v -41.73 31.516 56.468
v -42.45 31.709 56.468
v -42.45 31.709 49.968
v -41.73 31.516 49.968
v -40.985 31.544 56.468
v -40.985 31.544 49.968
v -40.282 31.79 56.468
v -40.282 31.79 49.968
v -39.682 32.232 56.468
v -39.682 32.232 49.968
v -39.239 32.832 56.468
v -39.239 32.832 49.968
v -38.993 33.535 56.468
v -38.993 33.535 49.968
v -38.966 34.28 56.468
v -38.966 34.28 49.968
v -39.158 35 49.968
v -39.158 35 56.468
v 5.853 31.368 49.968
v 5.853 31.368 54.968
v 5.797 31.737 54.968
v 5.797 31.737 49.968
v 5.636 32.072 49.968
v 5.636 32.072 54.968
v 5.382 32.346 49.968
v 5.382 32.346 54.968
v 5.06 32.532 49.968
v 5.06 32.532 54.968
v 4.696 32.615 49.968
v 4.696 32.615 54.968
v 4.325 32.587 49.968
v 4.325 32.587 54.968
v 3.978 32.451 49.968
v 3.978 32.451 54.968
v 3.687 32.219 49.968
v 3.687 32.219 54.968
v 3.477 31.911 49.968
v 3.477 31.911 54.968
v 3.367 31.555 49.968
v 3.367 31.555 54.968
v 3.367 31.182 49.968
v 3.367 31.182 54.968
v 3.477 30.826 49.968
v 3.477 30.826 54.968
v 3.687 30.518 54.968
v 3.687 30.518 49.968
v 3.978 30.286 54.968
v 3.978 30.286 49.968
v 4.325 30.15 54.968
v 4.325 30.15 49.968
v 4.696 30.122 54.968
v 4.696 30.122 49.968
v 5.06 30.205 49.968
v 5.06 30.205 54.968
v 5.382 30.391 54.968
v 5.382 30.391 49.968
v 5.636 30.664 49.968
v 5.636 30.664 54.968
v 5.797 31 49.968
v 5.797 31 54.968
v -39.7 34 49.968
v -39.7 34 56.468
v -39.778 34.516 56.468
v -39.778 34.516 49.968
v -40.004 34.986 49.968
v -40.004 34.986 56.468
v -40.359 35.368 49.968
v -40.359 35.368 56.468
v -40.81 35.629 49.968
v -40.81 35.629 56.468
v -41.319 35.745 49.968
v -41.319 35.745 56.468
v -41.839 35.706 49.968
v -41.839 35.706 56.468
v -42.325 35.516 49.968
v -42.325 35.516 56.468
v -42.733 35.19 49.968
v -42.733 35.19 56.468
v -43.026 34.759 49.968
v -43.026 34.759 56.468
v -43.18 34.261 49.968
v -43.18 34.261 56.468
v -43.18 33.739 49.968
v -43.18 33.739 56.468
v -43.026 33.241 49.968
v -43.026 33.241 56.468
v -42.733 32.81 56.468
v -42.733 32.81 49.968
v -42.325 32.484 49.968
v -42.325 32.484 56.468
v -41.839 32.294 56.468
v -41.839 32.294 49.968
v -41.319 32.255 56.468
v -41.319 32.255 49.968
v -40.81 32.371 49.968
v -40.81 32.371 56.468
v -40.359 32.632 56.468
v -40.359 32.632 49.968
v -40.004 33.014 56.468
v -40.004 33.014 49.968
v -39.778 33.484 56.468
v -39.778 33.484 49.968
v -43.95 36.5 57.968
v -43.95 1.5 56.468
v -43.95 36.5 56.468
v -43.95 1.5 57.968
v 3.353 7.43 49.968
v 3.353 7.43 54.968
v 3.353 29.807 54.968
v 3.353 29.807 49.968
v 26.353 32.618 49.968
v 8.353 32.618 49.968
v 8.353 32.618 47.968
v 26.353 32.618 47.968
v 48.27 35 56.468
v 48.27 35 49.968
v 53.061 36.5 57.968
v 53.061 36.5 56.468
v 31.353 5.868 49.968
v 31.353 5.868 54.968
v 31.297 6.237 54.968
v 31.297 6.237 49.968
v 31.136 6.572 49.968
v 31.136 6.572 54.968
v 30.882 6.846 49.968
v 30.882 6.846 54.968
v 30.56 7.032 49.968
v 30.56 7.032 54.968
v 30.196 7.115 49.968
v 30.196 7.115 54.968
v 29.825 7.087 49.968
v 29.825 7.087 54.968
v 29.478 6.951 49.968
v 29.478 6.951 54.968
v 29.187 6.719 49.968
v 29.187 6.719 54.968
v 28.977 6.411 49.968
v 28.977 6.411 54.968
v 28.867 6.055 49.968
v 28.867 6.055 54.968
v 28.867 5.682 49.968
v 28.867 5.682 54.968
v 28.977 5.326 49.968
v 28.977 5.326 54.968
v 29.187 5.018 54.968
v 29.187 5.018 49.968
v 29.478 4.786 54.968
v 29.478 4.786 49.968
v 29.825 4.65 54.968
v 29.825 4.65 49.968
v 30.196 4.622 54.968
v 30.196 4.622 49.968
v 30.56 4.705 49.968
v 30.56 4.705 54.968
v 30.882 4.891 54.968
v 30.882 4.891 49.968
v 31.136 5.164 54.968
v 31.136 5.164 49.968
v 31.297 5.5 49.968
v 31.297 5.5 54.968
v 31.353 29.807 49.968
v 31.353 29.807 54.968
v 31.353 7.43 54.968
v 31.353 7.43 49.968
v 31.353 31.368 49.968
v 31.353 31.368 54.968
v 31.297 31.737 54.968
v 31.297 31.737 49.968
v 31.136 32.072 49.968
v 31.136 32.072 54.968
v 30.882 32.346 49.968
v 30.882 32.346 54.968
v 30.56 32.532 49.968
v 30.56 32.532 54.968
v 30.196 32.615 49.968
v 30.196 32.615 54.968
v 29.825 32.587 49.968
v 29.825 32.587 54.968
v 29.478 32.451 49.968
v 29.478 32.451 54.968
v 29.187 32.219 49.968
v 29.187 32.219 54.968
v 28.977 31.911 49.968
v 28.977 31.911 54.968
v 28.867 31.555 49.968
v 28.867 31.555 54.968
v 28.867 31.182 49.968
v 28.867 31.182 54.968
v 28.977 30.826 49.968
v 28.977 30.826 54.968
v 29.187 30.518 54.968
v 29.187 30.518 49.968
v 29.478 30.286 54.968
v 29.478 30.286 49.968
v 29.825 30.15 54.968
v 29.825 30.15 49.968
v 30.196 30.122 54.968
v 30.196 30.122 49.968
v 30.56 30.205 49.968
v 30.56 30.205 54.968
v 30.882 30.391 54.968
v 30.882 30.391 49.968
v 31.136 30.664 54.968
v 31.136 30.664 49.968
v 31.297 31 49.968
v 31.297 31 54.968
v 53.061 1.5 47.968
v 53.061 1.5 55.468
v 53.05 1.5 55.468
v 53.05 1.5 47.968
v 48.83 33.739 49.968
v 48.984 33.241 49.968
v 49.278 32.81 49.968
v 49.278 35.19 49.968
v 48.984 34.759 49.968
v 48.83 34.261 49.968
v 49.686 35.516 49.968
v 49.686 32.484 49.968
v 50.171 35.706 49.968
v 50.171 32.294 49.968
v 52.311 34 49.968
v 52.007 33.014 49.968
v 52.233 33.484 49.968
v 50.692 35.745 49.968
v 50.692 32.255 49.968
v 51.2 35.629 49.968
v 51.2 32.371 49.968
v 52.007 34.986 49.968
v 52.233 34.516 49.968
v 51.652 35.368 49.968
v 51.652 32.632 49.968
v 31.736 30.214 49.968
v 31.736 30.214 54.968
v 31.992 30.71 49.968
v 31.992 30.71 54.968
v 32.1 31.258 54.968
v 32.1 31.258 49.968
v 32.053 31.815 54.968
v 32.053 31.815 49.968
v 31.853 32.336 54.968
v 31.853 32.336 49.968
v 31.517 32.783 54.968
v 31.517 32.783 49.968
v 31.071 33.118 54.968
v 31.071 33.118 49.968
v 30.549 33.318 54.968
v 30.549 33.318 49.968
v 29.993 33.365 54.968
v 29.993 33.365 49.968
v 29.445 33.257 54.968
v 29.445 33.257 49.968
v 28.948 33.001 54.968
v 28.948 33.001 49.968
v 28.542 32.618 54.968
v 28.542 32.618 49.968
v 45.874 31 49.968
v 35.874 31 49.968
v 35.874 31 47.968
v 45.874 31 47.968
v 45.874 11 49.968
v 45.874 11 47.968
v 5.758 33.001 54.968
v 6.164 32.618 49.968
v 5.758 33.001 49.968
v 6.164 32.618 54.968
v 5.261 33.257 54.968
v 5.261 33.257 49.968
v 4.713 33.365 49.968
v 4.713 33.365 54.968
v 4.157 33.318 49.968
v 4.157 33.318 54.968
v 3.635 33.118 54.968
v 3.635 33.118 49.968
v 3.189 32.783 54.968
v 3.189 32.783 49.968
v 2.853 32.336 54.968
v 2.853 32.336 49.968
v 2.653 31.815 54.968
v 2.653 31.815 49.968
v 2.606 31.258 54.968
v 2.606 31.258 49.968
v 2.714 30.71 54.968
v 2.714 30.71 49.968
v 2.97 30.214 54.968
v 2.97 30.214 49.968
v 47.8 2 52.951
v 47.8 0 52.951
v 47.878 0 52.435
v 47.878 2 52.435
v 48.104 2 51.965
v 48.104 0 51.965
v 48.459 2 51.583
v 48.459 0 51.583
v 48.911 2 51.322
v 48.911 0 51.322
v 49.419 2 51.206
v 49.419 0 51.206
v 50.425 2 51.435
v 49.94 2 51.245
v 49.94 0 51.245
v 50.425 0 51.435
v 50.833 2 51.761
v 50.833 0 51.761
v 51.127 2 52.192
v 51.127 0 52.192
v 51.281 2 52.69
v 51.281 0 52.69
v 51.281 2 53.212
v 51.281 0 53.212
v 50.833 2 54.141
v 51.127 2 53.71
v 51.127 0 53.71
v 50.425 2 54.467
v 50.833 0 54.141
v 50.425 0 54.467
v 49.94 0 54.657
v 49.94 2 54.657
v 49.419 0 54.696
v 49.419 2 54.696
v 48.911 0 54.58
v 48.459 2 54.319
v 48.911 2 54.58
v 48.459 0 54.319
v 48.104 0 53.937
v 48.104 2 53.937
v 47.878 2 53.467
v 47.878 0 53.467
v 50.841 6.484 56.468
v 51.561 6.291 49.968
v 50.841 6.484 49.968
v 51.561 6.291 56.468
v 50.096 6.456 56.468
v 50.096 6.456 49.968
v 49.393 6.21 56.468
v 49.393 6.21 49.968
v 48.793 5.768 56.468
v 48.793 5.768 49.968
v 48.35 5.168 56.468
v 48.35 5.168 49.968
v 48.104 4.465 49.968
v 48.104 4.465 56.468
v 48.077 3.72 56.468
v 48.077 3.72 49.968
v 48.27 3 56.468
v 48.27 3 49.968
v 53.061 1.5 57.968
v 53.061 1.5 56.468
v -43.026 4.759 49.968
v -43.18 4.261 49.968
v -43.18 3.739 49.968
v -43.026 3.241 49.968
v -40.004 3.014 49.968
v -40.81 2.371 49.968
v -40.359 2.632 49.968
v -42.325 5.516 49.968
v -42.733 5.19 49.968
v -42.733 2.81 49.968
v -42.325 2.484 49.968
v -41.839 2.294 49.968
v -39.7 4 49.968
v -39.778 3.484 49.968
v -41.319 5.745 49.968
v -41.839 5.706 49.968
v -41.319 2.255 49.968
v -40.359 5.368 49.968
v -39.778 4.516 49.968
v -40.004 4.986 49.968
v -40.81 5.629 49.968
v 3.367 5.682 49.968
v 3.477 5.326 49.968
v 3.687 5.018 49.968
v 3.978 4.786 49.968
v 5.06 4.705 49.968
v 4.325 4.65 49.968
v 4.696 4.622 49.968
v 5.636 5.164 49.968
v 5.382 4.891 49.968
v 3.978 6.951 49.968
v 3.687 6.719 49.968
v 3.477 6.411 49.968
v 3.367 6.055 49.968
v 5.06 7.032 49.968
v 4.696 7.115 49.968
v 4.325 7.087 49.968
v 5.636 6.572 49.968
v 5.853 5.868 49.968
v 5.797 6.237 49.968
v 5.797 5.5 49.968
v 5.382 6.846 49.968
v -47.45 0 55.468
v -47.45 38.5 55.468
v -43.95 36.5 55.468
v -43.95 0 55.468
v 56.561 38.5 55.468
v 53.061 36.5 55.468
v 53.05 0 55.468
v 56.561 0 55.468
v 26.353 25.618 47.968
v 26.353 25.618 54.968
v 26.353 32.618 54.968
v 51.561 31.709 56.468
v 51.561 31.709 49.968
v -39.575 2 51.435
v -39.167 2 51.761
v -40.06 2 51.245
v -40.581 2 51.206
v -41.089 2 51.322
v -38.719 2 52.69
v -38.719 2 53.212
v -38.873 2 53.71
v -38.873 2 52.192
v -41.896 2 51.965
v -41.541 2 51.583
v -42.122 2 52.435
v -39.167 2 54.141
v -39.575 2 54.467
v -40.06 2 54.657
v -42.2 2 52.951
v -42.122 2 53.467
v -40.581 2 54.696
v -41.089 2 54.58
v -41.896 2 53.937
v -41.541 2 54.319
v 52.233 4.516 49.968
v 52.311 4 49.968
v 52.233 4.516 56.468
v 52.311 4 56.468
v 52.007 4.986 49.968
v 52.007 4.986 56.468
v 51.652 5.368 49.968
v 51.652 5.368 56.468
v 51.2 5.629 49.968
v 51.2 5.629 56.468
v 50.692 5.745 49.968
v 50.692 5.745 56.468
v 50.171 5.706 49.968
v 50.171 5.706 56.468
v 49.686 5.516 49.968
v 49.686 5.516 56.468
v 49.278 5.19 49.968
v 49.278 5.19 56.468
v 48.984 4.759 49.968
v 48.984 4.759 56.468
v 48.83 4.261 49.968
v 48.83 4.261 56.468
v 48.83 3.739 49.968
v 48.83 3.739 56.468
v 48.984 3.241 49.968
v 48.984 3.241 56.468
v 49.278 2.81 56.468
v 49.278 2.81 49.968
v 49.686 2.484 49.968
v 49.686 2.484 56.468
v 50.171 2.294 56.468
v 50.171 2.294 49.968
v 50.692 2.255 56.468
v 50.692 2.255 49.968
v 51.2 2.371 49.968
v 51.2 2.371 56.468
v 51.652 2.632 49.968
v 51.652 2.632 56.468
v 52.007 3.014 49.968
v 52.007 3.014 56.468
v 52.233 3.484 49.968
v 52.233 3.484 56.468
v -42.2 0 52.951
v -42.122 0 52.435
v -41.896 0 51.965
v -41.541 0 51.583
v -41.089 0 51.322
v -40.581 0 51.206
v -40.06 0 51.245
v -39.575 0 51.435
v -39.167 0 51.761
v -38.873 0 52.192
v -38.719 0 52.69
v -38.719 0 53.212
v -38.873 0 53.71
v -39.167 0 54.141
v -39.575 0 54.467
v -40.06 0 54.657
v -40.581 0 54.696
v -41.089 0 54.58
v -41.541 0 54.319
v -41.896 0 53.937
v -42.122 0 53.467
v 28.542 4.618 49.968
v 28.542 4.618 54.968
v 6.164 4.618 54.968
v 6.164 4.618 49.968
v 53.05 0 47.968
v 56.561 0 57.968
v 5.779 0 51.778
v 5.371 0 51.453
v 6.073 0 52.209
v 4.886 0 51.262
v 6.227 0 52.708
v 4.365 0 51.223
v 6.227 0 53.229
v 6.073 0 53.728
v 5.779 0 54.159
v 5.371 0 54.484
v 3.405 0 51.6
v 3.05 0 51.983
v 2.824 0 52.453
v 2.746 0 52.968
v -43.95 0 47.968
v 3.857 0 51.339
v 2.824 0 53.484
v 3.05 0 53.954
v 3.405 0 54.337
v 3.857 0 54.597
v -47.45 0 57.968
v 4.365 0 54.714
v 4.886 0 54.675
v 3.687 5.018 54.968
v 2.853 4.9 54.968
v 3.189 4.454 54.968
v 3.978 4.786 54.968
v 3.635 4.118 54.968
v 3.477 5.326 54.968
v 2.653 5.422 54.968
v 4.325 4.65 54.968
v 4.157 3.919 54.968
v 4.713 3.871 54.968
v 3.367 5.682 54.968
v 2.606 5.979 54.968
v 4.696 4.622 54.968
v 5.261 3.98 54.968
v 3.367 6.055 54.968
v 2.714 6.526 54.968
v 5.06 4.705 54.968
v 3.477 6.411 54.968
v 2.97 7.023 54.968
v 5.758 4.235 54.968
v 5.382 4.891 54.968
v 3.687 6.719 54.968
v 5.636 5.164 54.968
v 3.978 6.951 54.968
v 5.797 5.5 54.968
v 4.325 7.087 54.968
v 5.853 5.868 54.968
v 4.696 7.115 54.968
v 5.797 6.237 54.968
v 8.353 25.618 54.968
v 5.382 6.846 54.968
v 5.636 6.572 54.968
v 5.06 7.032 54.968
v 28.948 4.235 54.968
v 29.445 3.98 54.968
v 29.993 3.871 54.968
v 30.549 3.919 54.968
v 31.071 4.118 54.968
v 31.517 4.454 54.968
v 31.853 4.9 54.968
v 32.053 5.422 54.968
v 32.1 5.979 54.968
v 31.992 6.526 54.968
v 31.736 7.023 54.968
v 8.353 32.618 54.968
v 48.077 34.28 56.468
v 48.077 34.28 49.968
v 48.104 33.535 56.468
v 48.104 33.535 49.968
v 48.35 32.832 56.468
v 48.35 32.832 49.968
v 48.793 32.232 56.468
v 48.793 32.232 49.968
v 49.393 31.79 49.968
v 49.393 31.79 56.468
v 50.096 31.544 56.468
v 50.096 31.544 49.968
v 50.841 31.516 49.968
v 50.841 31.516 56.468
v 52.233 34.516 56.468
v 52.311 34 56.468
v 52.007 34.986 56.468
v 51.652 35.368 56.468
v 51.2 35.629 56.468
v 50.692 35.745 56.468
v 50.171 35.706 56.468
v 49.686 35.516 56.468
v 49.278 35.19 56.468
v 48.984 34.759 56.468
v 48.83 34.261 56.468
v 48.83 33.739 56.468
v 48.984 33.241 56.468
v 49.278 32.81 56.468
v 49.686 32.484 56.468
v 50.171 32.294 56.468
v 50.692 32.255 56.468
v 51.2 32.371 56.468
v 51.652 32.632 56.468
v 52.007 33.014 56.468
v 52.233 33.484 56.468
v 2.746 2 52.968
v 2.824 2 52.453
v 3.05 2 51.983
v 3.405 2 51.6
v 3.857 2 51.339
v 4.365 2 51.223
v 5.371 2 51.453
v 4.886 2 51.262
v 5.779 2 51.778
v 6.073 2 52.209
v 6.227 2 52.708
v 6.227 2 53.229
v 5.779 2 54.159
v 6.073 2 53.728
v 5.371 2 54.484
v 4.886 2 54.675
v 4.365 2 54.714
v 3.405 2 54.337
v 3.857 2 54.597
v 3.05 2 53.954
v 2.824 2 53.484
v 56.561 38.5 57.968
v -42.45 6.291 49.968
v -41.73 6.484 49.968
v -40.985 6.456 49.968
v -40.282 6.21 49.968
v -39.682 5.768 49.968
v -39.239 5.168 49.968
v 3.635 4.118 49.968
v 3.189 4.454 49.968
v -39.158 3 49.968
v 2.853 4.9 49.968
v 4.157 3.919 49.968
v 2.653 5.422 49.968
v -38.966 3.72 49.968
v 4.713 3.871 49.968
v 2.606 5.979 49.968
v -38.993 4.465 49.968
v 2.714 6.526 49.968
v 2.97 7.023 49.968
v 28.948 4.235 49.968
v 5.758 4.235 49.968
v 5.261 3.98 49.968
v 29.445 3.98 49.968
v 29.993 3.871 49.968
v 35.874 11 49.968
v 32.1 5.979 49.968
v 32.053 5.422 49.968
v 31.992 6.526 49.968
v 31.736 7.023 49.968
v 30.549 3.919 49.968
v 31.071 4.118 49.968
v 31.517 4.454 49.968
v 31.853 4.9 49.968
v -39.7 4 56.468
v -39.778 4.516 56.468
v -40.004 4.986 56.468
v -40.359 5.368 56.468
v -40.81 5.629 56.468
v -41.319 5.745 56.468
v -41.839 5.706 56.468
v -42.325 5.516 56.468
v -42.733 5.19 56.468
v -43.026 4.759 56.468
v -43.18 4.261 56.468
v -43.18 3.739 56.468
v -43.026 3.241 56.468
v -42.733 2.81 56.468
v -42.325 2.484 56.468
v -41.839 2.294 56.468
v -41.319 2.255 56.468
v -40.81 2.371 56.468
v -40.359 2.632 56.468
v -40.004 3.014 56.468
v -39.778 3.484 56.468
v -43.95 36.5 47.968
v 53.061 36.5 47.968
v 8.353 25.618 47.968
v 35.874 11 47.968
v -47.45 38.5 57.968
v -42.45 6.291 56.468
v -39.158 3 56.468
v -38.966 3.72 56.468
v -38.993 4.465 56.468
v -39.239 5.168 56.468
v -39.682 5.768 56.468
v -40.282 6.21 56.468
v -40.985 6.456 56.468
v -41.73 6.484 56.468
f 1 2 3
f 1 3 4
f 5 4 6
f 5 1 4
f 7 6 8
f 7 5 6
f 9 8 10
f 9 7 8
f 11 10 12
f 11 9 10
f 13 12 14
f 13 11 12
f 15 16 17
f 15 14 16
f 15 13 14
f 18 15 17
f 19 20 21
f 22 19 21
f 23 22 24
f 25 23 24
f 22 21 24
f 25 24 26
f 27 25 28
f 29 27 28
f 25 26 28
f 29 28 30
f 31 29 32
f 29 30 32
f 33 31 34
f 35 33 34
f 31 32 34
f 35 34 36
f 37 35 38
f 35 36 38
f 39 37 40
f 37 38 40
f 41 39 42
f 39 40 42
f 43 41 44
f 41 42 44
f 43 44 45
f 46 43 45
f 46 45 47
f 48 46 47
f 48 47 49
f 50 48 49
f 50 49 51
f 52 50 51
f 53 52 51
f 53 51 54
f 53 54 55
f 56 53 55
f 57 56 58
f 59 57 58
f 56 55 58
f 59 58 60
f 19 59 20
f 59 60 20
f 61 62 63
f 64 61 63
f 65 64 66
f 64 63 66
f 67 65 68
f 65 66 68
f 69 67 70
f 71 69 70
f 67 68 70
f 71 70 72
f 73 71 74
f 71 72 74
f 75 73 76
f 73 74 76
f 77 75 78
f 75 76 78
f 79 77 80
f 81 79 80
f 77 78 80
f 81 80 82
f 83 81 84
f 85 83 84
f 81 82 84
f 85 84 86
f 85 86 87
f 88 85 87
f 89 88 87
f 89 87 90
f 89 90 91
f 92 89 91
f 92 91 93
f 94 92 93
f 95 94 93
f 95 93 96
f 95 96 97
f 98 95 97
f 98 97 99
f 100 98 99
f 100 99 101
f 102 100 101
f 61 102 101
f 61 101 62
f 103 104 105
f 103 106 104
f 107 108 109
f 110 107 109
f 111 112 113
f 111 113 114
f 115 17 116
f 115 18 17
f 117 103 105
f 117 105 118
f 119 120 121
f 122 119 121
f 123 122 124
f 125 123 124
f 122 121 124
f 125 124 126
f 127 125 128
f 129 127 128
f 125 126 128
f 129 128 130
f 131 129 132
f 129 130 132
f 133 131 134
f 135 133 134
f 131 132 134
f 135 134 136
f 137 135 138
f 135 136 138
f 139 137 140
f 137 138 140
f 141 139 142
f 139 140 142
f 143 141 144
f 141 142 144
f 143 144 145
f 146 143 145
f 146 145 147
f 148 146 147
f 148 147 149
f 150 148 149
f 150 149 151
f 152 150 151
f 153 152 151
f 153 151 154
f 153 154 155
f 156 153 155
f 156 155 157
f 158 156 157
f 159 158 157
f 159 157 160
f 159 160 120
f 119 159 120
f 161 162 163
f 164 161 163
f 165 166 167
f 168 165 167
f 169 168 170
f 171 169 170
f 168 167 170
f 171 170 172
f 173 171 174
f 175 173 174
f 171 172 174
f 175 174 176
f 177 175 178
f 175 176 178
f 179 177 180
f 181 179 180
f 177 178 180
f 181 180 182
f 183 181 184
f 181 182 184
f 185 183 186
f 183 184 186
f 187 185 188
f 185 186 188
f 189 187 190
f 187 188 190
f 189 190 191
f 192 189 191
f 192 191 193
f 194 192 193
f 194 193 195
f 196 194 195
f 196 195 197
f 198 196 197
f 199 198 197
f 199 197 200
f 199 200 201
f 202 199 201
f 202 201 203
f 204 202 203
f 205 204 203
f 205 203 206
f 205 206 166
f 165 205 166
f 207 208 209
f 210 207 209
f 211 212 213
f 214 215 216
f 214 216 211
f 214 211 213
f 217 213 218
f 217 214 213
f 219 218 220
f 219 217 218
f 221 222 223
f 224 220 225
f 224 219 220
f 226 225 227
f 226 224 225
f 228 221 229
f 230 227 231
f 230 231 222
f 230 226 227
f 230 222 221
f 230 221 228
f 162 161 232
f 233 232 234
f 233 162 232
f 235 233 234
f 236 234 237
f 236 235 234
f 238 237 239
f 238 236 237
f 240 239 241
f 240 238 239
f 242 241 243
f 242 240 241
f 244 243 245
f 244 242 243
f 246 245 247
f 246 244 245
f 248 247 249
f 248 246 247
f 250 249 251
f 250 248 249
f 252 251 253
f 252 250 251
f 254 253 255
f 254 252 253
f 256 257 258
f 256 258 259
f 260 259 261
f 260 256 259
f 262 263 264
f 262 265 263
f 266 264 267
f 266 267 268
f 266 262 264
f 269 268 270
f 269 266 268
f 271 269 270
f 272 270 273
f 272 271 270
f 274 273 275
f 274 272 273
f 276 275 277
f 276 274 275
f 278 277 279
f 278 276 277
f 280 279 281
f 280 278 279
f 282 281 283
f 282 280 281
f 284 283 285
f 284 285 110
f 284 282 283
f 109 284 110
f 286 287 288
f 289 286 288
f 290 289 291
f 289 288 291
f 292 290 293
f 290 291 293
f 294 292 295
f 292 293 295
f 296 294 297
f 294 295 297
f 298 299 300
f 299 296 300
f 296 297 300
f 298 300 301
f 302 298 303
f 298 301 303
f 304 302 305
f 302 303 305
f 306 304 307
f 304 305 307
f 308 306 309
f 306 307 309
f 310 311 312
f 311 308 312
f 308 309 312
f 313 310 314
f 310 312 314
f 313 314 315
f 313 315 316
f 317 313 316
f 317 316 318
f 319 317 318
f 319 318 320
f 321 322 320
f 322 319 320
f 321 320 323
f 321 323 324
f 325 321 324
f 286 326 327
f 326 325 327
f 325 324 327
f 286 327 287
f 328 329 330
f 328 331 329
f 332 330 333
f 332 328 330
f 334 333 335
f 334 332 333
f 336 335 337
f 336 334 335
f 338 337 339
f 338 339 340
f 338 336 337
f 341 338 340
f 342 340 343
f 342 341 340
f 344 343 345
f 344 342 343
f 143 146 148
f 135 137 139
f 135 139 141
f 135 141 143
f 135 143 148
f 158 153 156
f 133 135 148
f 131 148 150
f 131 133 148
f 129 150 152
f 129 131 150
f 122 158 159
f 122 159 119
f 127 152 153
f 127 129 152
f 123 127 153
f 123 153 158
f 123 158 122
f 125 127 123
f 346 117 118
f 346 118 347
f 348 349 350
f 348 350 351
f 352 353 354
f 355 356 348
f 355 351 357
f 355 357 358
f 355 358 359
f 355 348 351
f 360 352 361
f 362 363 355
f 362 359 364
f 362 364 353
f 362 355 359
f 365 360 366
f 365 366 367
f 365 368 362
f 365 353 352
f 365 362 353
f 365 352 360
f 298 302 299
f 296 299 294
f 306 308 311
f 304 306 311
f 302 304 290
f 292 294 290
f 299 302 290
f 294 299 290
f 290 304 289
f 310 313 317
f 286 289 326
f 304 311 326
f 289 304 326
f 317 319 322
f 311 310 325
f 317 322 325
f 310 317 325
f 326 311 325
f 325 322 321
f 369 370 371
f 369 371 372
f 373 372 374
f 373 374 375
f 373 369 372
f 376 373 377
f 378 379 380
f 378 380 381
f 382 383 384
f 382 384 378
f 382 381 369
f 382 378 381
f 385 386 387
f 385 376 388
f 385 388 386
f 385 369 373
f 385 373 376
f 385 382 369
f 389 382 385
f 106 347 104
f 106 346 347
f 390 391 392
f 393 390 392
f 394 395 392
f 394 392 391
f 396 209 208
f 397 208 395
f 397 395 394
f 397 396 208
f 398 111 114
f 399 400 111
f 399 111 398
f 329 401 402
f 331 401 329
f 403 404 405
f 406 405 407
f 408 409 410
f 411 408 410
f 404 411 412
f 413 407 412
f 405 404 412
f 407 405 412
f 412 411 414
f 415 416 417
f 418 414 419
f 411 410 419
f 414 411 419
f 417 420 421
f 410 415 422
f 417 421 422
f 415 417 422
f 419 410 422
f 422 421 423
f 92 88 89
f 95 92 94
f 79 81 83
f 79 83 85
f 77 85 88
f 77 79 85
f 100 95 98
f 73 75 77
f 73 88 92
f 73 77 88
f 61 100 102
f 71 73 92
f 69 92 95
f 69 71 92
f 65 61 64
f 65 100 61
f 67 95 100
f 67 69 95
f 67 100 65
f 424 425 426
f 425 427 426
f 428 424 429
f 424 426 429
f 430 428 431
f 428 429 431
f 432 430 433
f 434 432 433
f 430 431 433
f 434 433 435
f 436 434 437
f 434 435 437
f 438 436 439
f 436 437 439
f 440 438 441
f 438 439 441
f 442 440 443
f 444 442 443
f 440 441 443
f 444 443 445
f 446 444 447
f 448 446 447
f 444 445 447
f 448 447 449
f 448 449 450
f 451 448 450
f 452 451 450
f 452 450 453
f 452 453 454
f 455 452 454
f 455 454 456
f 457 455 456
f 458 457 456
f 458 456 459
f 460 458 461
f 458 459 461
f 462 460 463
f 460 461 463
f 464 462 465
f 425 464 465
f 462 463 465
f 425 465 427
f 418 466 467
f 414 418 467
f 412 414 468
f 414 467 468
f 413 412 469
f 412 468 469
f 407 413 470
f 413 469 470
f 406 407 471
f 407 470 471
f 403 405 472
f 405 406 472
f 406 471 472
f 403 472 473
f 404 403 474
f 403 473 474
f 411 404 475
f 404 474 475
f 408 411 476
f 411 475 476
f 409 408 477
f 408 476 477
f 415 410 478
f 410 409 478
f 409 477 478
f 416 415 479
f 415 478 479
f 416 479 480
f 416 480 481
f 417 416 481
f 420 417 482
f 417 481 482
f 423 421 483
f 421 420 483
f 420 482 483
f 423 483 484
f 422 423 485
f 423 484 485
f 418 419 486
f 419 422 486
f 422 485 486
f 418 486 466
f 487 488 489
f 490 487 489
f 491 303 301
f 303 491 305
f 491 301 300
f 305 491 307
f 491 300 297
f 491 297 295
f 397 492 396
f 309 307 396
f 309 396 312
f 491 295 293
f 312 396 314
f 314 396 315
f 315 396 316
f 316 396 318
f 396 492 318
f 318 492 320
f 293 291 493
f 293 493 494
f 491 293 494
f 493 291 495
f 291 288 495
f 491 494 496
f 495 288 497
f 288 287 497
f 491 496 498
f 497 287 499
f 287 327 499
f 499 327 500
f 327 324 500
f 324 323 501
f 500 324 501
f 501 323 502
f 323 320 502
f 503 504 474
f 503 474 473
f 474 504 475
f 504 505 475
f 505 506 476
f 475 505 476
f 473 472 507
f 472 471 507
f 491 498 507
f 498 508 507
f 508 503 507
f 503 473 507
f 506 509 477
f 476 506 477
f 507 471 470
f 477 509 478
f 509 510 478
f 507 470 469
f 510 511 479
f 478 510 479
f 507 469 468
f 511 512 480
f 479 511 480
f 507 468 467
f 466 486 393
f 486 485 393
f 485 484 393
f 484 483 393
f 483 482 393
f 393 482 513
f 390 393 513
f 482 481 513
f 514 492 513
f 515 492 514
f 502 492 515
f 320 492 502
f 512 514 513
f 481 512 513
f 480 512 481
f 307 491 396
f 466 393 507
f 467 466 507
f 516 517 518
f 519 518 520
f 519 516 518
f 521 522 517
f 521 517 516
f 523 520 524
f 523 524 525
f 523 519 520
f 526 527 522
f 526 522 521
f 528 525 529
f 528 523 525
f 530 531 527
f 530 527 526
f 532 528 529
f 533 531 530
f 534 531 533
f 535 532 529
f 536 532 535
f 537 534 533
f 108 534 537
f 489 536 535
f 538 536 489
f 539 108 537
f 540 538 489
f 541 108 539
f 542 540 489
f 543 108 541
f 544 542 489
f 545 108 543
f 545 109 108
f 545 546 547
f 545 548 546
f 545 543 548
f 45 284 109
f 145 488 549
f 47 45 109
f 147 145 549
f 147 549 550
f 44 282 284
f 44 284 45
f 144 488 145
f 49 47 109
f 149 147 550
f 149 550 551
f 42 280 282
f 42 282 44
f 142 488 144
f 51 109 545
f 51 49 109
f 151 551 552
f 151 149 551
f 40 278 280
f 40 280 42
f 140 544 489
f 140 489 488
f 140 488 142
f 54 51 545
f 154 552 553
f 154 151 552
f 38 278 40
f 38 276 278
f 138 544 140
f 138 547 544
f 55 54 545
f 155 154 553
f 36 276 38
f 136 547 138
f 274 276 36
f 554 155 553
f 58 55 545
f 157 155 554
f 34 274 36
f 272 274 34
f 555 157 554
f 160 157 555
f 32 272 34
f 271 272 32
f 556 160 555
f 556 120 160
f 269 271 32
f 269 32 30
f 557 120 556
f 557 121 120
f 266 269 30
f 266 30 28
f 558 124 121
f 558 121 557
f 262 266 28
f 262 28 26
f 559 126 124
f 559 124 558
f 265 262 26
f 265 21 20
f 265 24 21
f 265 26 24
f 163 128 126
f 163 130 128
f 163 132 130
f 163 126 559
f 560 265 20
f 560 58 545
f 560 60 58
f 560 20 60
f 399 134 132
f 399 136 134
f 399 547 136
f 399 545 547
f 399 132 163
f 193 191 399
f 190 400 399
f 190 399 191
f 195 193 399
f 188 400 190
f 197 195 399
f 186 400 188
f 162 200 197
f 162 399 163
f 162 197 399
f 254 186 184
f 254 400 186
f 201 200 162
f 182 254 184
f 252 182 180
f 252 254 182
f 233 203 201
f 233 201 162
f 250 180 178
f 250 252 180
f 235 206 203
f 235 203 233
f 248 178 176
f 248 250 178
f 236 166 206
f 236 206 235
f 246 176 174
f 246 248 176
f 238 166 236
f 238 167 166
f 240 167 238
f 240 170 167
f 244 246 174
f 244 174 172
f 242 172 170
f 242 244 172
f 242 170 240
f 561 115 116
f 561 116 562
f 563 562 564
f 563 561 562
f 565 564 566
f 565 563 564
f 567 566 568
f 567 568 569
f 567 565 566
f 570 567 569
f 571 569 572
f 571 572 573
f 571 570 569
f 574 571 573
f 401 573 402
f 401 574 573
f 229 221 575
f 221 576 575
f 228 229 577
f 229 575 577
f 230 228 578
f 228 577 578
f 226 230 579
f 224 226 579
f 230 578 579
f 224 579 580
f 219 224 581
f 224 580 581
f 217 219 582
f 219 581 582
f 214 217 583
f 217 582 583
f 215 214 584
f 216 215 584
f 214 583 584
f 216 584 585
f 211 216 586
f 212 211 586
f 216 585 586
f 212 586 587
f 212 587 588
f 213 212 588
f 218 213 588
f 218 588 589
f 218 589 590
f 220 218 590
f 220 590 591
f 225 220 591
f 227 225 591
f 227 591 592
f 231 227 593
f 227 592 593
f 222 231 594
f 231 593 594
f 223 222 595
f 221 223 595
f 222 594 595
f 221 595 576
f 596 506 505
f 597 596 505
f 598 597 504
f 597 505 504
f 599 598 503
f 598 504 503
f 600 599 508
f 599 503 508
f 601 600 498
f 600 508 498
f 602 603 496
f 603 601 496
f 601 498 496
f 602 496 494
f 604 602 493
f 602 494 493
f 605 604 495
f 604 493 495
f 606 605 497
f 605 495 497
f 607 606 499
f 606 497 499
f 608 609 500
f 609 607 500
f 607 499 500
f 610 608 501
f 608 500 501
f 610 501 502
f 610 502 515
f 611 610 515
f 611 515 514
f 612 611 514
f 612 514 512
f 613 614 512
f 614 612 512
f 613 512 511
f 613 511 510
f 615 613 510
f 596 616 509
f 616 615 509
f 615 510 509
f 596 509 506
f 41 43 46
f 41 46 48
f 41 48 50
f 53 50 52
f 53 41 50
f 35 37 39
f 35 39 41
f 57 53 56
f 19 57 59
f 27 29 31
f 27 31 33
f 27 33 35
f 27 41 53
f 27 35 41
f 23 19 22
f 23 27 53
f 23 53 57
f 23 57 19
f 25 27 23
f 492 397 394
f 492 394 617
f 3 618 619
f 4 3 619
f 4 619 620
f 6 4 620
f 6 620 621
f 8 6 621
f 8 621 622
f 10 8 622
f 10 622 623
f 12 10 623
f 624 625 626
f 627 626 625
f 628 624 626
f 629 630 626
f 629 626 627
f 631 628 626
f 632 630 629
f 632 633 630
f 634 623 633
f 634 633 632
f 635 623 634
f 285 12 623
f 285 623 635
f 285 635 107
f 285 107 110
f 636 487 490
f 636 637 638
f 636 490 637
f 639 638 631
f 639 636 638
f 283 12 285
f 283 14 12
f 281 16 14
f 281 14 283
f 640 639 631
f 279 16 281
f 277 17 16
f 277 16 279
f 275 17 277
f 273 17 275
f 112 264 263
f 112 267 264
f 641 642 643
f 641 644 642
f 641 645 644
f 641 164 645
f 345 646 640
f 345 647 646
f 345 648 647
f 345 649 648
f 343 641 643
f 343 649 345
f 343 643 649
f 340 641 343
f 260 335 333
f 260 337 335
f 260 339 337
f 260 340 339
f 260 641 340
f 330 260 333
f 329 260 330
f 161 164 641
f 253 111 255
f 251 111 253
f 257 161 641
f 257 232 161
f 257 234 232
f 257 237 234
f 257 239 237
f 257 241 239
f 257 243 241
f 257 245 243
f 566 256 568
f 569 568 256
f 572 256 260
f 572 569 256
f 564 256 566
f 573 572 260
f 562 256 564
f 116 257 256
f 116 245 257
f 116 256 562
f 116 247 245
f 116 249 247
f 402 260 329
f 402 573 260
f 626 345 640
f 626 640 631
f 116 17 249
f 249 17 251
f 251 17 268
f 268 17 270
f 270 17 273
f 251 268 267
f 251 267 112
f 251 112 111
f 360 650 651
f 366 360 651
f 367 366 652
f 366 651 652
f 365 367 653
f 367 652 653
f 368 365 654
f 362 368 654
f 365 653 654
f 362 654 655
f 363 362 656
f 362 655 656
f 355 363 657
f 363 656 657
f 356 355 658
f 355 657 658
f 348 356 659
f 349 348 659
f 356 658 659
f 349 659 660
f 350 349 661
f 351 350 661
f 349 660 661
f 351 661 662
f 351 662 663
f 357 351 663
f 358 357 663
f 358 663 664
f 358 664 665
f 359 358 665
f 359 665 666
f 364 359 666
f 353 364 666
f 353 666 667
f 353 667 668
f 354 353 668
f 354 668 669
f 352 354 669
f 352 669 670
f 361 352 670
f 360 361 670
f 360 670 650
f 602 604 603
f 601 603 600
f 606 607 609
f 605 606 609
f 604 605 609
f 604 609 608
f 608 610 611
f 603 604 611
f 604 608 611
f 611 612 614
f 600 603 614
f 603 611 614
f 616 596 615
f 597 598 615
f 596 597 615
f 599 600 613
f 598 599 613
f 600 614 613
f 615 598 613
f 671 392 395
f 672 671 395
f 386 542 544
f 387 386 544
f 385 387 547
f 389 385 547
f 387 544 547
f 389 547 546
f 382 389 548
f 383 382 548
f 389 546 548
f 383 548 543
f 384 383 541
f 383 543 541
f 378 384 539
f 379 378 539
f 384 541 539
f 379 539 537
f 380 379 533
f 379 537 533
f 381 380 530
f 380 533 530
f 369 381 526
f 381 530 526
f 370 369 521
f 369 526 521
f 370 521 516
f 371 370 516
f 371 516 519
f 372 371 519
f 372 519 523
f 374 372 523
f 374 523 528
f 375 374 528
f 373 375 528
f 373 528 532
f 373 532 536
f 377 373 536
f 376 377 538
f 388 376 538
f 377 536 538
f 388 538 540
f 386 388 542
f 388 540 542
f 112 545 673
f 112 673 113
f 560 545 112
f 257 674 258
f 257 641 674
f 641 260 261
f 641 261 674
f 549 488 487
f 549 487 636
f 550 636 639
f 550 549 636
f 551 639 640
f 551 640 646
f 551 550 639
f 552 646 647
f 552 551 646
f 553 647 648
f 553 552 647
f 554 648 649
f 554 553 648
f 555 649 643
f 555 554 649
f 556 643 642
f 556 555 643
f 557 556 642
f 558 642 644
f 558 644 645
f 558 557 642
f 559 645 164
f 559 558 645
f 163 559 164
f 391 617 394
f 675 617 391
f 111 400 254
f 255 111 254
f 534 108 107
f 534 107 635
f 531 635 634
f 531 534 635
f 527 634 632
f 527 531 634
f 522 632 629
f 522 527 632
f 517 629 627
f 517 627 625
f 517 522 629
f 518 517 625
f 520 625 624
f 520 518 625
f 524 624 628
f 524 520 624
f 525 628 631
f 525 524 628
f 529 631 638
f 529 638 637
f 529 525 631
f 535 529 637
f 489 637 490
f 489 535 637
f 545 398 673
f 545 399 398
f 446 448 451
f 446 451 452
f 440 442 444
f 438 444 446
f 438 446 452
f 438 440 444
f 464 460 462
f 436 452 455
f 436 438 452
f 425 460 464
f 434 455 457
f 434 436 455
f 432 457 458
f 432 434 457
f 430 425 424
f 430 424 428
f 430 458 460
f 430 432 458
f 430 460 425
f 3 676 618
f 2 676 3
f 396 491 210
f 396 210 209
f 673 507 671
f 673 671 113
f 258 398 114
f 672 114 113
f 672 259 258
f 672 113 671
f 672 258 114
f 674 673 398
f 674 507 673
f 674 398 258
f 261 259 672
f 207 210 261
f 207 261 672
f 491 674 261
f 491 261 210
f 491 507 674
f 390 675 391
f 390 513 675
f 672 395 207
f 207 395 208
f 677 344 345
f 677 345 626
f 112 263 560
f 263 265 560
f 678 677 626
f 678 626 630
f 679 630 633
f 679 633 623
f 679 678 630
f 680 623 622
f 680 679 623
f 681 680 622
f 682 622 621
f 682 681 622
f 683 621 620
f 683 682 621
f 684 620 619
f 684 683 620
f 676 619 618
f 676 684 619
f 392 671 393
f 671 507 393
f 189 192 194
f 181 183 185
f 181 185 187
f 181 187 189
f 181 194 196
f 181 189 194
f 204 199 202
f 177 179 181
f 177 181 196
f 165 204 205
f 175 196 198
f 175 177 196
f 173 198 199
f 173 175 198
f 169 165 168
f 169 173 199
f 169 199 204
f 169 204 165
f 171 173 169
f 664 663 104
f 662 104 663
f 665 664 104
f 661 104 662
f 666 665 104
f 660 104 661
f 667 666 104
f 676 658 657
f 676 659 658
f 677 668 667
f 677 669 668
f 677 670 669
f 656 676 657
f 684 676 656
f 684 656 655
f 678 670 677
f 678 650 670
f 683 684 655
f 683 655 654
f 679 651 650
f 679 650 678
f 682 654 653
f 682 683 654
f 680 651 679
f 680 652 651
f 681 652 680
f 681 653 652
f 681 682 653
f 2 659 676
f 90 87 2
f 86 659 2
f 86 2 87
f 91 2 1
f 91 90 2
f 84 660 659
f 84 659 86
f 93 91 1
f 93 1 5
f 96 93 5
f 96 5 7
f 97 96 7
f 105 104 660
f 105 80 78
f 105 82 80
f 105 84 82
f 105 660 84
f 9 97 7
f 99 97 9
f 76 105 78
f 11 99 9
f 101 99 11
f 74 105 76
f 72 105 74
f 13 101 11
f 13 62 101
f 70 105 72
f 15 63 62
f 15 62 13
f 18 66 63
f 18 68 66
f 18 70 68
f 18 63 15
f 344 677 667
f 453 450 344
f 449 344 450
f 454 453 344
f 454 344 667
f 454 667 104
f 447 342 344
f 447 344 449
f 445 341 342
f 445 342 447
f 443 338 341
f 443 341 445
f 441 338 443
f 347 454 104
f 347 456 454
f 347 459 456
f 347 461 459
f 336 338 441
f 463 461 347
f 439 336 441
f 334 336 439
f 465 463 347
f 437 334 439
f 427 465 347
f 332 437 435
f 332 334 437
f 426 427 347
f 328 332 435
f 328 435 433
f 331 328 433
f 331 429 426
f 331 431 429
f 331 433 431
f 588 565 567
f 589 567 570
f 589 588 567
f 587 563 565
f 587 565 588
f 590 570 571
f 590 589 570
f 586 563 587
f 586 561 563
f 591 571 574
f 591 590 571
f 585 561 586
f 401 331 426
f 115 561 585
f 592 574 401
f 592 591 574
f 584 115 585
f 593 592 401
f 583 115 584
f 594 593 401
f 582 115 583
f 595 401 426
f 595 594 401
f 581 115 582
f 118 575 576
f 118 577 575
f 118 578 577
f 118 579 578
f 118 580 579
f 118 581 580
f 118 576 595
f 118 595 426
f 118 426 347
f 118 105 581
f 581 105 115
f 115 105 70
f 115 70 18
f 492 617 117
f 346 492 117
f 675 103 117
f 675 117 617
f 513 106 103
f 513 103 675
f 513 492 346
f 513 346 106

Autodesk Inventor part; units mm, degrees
ref_plane "YZ Plane" through (0, 0, 0) normal (1, 0, 0) x (0, 1, 0)
ref_plane "XZ Plane" through (0, 0, 0) normal (0, 1, 0) x (-1, 0, 0)
ref_plane "XY Plane" through (0, 0, 0) normal (0, 0, 1) x (1, 0, 0)
sketch "Esboço1" plane through (0, 0, 0) normal (0, 1, 0) x (-1, 0, 0)
  line L0 (-56.5608, 57.9684) -> (47.4498, 57.9684)
  line L1 (47.4498, 57.9684) -> (47.4498, 47.9684)
  line L2 (-56.5608, 47.9684) -> (-56.5608, 57.9684)
  circle A0 centre (-49.5502, 52.951) radius 1.75
  circle A1 centre (40.4498, 52.951) radius 1.75
  circle A2 centre (-4.4961, 52.9684) radius 1.75
  line L3 (37.4498, 47.9684) -> (-46.5502, 47.9684)
  line L4 (43.9498, 47.9684) -> (37.2226, 47.9684)
  line L5 (37.4498, 47.9684) -> (-46.5502, 47.9684)
  line L6 (-53.0502, 47.9684) -> (-46.323, 47.9684)
  line L7 (47.4498, 47.9684) -> (-56.5608, 47.9684)
  line L8 (-53.0502, 47.9684) -> (-53.0502, 57.9684) construction
  line L9 (47.4498, 55.4684) -> (-56.5608, 55.4684)
  line L10 (-53.0502, 47.9684) -> (-53.0502, 57.9684)
  line L11 (43.9498, 47.9684) -> (43.9498, 57.9684)
  point P0 (43.9498, 55.4684)
  point P1 (-53.0502, 55.4684)
  dimension "d4" = 3.5
  dimension "d5" = 5
  dimension "d16" = 2.5
  dimension "d17" = 10
  dimension "d77" = 3.5106
  dimension "d78" = 3.5
extrude "Extrusão1" add sketch "Esboço1" along normal blind 38.5 contours L0 L10 L9 L2 | L0 L11 L9 L10 | L0 L1 L9 L11
extrude "Extrusão2" add sketch "Esboço1" along normal blind 2.5 contours L9 L11 L4 L3 L6 L10
sketch "Esboço2" plane through (-47.4498, 0, 57.9684) normal (0, 0, 1) x (1, 0, 0)
  line L0 (3.5, 36.5) -> (100.5106, 36.5)
  line L1 (100.5106, 36.5) -> (100.5106, 1.5)
  line L2 (100.5106, 1.5) -> (3.5, 1.5)
  line L3 (3.5, 1.5) -> (3.5, 36.5)
  line L4 (0, 0) -> (0, 38.5) projected
  line L5 (0, 38.5) -> (104.0106, 38.5) projected
  line L6 (0, 0) -> (104.0106, 0) projected
  line L7 (104.0106, 0) -> (104.0106, 38.5) projected
  circle A0 centre (6, 34) radius 1.75
  circle A1 centre (6, 34) radius 2.5
  circle A2 centre (6, 4) radius 1.75
  circle A3 centre (6, 4) radius 2.5
  circle A4 centre (98.0106, 34) radius 2.5
  circle A5 centre (98.0106, 34) radius 1.75
  circle A6 centre (98.0106, 4) radius 2.5
  circle A7 centre (98.0106, 4) radius 1.75
  line L8 (78.8028, 29.8071) -> (78.8028, 7.4296)
  line L9 (21.5, 17) -> (31.5, 17)
  line L10 (31.5, 17) -> (31.5, 7)
  line L11 (31.5, 7) -> (21.5, 7)
  line L12 (21.5, 7) -> (21.5, 17)
  line L13 (35.5, 23.5) -> (45.5, 23.5)
  line L14 (45.5, 23.5) -> (45.5, 13.5)
  line L15 (45.5, 13.5) -> (35.5, 13.5)
  line L16 (35.5, 13.5) -> (35.5, 23.5)
  line L17 (21.5, 31.5) -> (31.5, 31.5)
  line L18 (31.5, 31.5) -> (31.5, 21.5)
  line L19 (31.5, 21.5) -> (21.5, 21.5)
  line L20 (21.5, 21.5) -> (21.5, 31.5)
  line L21 (7.5, 23.5) -> (17.5, 23.5)
  line L22 (17.5, 23.5) -> (17.5, 13.5)
  line L23 (17.5, 13.5) -> (7.5, 13.5)
  line L24 (7.5, 13.5) -> (7.5, 23.5)
  line L25 (83.324, 31) -> (93.324, 31)
  line L26 (93.324, 31) -> (93.324, 11)
  line L27 (93.324, 11) -> (83.324, 11)
  line L28 (83.324, 11) -> (83.324, 31)
  circle A8 centre (26.5, 26.5) radius 3.5
  circle A9 centre (40.5, 18.5) radius 3.5
  circle A10 centre (26.5, 11.5) radius 3.5
  circle A11 centre (12.5, 18.5) radius 3.5
  line L29 (8.2913, 35) -> (95.7193, 35)
  line L30 (5, 6.2913) -> (5, 31.7087)
  line L31 (95.7193, 3) -> (8.2913, 3)
  line L32 (99.0106, 31.7087) -> (99.0106, 6.2913)
  circle A12 centre (52.0528, 31.3683) radius 1.25
  circle A13 centre (77.5528, 5.8683) radius 1.25
  circle A14 centre (77.5528, 31.3683) radius 1.25
  circle A15 centre (52.0528, 5.8683) radius 1.25
  circle A16 centre (52.0528, 5.8683) radius 2
  circle A17 centre (52.0528, 31.3683) radius 2
  circle A18 centre (77.5528, 31.3683) radius 2
  circle A19 centre (77.5528, 5.8683) radius 2
  line L33 (55.8028, 32.6183) -> (73.8028, 32.6183)
  line L34 (73.8028, 32.6183) -> (73.8028, 25.6183)
  line L35 (73.8028, 25.6183) -> (55.8028, 25.6183)
  line L36 (55.8028, 25.6183) -> (55.8028, 32.6183)
  line L37 (50.8028, 7.4296) -> (50.8028, 29.8071)
  line L38 (50.8028, 31.3683) -> (50.8028, 31.5)
  line L39 (53.6141, 32.6183) -> (75.9916, 32.6183)
  line L40 (78.8028, 4.6183) -> (77.5528, 4.6183)
  line L41 (75.9916, 4.6183) -> (53.6141, 4.6183)
  line L42 (52.0528, 4.6183) -> (50.8028, 4.6183)
  point P0 (47.4498, 0)
  point P1 (26.5, 17)
  point P2 (64.8028, 25.6183)
  point P3 (64.8028, 32.6183)
  dimension "d81" = 2.5
  dimension "d82" = 2.5
  dimension "d84" = 2.5
  dimension "d22" = 3.5
  dimension "d23" = 2
  dimension "d25" = 3.5
  dimension "d26" = 3.5
  dimension "d27" = 5
  dimension "d28" = 3.5
  dimension "d29" = 5
  dimension "d30" = 5
  dimension "d31" = 3.5
  dimension "d32" = 5
  dimension "d33" = 3.5
  dimension "d34" = 104.0106
  dimension "d35" = 38.5
  dimension "d36" = 28
  dimension "d38" = 10
  dimension "d39" = 10
  dimension "d40" = 10
  dimension "d41" = 10
  dimension "d42" = 10
  dimension "d43" = 10
  dimension "d44" = 10
  dimension "d45" = 10
  dimension "d46" = 10
  dimension "d47" = 20
  dimension "d49" = 4
  dimension "d50" = 4
  dimension "d51" = 4
  dimension "d52" = 4
  dimension "d57" = 5.5
  dimension "d58" = 7
  dimension "d59" = 7
  dimension "d60" = 7
  dimension "d61" = 7
  dimension "d65" = 1.5
  dimension "d72" = 4.5
  dimension "d83" = 2.5
  dimension "d85" = 4
  dimension "d86" = 4
  dimension "d87" = 4
  dimension "d88" = 4
  dimension "d90" = 5
  dimension "d91" = 7
extrude "Extrusão3" add sketch "Esboço2" against normal blind 10 contours L0 A1 L3 | L0 A4 L29 A1 | A1 | A1 L30 A3 L3 | L0 L1 A4 | A4 | L29 A4 L32 A6 L31 A3 L30 A1 | A3 L2 L3 | A3 | L1 A6 L32 A4 | A3 L31 A6 L2 | A6 | L1 L2 A6 | A0 | A2 | A5 | A7 | L8 A19 L41 A16 L37 A17 L39 L36 L35 L34 A18 | A18 | A19 | L34 L35 L36 L33 | A16 | A17 | L9 L10 L11 L12 | L13 L14 L15 L16 | L17 L18 L19 L20 | L21 L22 L23 L24 | L25 L26 L27 L28 | A8 | A9 | A10 | A11 | A12 | A13 | A14 | A15
extrude "Extrusão4" cut sketch "Esboço2" against normal blind 8 contours L29 A4 L32 A6 L31 A3 L30 A1 | L8 A19 L41 A16 L37 A17 L39 L36 L35 L34 A18 | A18 | A19 | L34 L35 L36 L33 | A16 | A17 | L9 L10 L11 L12 | L13 L14 L15 L16 | L17 L18 L19 L20 | L21 L22 L23 L24 | L25 L26 L27 L28 | A8 | A9 | A10 | A11 | A12 | A13 | A14 | A15
extrude "Extrusão5" cut sketch "Esboço2" against normal blind 1.5 contours L0 A1 L3 | L0 A4 L29 A1 | A1 | A1 L30 A3 L3 | L0 L1 A4 | A4 | A3 L2 L3 | A3 | L1 A6 L32 A4 | A3 L31 A6 L2 | A6 | L1 L2 A6 | A0 | A2 | A5 | A7
extrude "Extrusão6" cut sketch "Esboço2" against normal blind 8 contours A0 | A2 | A5 | A7
extrude "Extrusão7" cut sketch "Esboço2" against normal through all contours L25 L26 L27 L28
extrude "Extrusão8" cut sketch "Esboço1" along normal blind 2 contours A0 | A1 | A2
extrude "Extrusão9" add sketch "Esboço2" against normal blind 8.5 contours L8 A19 L41 A16 L37 A17 L39 L36 L35 L34 A18 | A18 | A19 | A16 | A17
extrude "Extrusão10" cut sketch "Esboço2" against normal blind 3 contours L8 A19 L41 A16 L37 A17 L39 L36 L35 L34 A18 | A18 | A19 | A16 | A17 | A13 | A14 | A15
extrude "Extrusão11" cut sketch "Esboço2" against normal through all contours L34 L35 L36 L33
properties part number "suporte_lcd_botoes"
